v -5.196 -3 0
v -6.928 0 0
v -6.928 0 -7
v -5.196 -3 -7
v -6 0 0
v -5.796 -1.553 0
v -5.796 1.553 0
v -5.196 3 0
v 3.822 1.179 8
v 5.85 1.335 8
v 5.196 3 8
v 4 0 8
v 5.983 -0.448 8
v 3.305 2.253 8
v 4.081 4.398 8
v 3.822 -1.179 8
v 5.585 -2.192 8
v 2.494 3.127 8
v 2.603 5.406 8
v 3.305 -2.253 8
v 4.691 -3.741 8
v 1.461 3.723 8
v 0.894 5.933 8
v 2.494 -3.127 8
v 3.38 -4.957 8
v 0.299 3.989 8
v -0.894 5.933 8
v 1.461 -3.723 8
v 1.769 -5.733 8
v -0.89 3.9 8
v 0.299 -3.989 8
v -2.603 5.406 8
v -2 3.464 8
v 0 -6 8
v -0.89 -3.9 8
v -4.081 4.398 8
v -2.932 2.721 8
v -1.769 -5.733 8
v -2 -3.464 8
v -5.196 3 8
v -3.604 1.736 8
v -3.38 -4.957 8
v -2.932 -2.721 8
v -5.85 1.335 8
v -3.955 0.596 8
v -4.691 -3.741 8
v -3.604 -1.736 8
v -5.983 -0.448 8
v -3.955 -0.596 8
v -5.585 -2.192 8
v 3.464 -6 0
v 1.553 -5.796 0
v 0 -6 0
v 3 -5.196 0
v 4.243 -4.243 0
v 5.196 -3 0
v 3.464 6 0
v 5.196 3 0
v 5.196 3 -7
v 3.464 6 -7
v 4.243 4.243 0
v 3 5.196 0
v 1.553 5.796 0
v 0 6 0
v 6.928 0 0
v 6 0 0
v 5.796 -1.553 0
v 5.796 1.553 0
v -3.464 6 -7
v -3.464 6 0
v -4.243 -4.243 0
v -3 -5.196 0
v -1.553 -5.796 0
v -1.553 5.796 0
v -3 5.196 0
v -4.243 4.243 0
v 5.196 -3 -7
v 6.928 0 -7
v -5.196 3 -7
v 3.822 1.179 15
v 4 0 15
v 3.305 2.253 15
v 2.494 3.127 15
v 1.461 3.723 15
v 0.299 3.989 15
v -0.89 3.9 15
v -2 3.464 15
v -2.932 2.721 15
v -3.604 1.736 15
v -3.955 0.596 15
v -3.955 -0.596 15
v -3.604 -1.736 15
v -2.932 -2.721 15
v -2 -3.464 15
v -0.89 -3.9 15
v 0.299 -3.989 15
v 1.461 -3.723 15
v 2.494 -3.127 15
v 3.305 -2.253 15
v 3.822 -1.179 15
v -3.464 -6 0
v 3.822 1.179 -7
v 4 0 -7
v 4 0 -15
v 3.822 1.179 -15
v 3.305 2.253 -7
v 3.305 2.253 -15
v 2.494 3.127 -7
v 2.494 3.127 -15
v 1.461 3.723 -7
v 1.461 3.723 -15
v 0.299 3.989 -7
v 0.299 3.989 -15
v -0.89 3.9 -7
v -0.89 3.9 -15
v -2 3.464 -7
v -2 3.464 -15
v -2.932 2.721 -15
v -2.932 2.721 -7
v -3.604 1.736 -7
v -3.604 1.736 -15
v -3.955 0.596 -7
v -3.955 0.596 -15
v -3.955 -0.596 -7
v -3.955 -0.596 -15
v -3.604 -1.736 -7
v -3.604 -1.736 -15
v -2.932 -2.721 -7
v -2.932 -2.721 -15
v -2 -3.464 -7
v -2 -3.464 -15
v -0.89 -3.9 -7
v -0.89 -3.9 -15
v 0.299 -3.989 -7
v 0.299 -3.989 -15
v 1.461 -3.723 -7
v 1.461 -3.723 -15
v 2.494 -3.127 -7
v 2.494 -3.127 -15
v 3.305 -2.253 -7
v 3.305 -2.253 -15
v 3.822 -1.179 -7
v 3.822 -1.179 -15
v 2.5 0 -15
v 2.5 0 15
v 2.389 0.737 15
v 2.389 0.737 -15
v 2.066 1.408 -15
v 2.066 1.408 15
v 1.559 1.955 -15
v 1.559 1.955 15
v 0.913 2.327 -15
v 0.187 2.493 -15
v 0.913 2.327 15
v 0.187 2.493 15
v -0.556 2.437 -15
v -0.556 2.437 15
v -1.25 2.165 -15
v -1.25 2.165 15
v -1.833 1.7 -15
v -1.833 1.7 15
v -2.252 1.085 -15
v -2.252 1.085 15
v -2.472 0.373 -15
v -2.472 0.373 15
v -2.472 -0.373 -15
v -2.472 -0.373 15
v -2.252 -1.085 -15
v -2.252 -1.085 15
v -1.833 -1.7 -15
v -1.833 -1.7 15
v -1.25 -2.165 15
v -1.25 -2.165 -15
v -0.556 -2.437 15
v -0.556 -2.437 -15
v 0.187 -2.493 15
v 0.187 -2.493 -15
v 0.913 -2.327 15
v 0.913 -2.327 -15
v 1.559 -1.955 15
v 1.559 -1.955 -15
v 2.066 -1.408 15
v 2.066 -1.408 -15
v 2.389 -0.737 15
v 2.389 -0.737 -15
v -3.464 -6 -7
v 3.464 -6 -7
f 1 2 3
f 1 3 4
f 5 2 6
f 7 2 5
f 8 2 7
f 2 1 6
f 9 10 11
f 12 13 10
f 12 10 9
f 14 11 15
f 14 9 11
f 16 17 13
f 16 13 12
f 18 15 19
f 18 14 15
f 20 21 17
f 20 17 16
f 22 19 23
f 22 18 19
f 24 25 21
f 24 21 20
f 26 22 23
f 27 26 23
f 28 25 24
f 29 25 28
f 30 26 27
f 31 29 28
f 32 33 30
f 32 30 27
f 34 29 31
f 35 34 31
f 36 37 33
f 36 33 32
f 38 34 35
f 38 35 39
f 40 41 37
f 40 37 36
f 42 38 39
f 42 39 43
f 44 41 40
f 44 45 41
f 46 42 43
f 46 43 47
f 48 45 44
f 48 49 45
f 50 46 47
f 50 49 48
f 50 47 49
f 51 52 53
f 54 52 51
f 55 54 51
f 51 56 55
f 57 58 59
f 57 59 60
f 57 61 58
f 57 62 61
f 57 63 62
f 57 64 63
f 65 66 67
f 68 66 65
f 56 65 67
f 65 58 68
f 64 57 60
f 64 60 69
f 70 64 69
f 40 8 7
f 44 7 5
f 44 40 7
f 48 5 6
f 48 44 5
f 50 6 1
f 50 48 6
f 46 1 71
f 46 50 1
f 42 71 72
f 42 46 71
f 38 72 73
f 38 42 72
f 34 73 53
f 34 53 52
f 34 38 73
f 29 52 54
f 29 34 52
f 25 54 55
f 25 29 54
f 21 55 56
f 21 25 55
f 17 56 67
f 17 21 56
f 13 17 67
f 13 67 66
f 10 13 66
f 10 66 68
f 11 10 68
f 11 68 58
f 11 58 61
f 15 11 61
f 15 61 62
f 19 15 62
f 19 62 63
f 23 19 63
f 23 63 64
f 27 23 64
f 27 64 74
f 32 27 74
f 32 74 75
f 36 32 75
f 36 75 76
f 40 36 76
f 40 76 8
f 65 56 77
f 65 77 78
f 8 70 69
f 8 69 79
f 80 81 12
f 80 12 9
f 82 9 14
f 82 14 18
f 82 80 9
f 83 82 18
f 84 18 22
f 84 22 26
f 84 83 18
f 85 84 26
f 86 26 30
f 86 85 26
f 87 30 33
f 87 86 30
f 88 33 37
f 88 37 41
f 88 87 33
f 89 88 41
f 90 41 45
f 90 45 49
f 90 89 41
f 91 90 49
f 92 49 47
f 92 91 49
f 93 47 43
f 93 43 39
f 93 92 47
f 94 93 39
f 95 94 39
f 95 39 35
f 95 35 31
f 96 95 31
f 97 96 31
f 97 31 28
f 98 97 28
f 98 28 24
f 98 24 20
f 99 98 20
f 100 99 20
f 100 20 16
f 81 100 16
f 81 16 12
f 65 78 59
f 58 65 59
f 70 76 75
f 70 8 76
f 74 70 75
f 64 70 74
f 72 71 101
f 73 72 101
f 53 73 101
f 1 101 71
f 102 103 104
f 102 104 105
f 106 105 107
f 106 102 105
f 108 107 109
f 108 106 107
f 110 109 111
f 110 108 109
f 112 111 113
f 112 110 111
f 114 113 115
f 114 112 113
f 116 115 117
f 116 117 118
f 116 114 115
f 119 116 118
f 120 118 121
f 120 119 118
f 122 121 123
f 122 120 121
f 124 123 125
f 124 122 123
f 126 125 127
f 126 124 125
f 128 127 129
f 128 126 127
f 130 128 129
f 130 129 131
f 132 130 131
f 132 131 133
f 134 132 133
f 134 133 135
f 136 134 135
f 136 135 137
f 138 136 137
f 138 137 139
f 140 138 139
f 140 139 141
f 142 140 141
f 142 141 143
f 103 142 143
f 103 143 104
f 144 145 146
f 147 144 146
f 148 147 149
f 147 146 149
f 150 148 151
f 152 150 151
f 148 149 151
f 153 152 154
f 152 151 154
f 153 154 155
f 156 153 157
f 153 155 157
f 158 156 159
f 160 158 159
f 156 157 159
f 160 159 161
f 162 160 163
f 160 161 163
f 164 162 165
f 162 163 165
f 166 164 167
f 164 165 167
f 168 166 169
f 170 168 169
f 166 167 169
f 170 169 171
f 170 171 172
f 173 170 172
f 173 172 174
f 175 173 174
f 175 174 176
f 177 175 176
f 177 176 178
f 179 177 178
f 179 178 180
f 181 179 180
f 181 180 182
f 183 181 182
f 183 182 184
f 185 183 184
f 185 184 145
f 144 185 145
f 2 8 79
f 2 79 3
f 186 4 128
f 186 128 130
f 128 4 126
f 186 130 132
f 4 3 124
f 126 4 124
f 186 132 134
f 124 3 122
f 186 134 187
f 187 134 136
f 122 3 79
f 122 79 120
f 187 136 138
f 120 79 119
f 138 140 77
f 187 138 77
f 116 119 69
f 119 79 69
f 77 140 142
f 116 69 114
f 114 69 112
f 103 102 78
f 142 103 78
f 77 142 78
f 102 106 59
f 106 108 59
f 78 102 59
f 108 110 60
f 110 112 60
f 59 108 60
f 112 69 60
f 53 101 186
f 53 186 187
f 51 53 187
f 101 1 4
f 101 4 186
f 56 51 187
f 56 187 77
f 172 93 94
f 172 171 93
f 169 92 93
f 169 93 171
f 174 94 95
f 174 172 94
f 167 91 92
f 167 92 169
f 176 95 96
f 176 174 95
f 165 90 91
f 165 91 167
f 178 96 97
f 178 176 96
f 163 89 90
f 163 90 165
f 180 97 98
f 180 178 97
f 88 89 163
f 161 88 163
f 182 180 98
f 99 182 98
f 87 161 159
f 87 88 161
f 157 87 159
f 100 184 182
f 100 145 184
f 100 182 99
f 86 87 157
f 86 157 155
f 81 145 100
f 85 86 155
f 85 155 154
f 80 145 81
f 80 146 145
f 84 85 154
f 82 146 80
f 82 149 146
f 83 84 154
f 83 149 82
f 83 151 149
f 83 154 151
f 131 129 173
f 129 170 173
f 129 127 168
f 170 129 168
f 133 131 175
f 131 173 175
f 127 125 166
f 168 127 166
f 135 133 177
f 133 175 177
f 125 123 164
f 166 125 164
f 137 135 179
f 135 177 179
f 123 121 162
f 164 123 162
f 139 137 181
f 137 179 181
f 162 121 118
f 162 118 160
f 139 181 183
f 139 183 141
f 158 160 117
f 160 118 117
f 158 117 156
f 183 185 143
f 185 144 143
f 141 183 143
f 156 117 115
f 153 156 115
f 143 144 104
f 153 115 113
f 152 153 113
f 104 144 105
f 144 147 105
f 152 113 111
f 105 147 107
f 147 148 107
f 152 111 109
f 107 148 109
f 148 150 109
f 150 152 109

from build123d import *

# Parameters (mm, degrees)
SKETCH1_R           = 4
BOSS_EXTRUDE1_DEPTH = 7
SKETCH1_3_R         = 4
SKETCH1_3_R_2       = 2.5
BOSS_EXTRUDE2_DEPTH = 15
BOSS_EXTRUDE3_START = 8
SKETCH1_4_R         = 4
BOSS_EXTRUDE3_DEPTH = 8
BOSS_EXTRUDE4_START = 15
SKETCH1_5_R         = 4
SKETCH1_5_R_2       = 2.5
BOSS_EXTRUDE4_DEPTH = 15


with BuildPart() as part:
    # Sketch1 → Boss-Extrude1 (new body)
    with BuildSketch(Plane.XY):
        Polygon((6.92820323, 0), (3.464101615, 6), (-3.464101615, 6), (-6.92820323, 0), (-3.464101615, -6), (3.464101615, -6), align=None)
        Circle(SKETCH1_R, mode=Mode.SUBTRACT)
    extrude(amount=-BOSS_EXTRUDE1_DEPTH)

    # Sketch1<3> → Boss-Extrude2 (add)
    with BuildSketch(Plane.XY):
        Circle(SKETCH1_3_R)
        Circle(SKETCH1_3_R_2, mode=Mode.SUBTRACT)
    extrude(amount=-BOSS_EXTRUDE2_DEPTH)

    # Sketch1<4> → Boss-Extrude3 (add)
    with BuildSketch(Plane.XY.offset(BOSS_EXTRUDE3_START)):
        with BuildLine():
            ThreePointArc((6, 0), (5.795555021, 1.552914036), (5.196152666, 2.999999578))
            ThreePointArc((5.196152666, 2.999999578), (3.000000209, 5.196152302), (-3e-09, 6))
            ThreePointArc((-3e-09, 6), (-3.000000081, 5.196152376), (-5.196152514, 2.999999842))
            ThreePointArc((-5.196152514, 2.999999842), (-6, 1.76e-07), (-5.19615269, -2.999999537))
            ThreePointArc((-5.19615269, -2.999999537), (-3.000000229, -5.19615229), (5e-09, -6))
            ThreePointArc((5e-09, -6), (3.000000007, -5.196152419), (5.196152428, -2.999999991))
            ThreePointArc((5.196152428, -2.999999991), (5.795554959, -1.552914265), (6, 0))
        make_face()
        Circle(SKETCH1_4_R, mode=Mode.SUBTRACT)
    extrude(amount=-BOSS_EXTRUDE3_DEPTH)

    # Sketch1<5> → Boss-Extrude4 (add)
    with BuildSketch(Plane.XY.offset(BOSS_EXTRUDE4_START)):
        Circle(SKETCH1_5_R)
        Circle(SKETCH1_5_R_2, mode=Mode.SUBTRACT)
    extrude(amount=-BOSS_EXTRUDE4_DEPTH)


solid = part.part
